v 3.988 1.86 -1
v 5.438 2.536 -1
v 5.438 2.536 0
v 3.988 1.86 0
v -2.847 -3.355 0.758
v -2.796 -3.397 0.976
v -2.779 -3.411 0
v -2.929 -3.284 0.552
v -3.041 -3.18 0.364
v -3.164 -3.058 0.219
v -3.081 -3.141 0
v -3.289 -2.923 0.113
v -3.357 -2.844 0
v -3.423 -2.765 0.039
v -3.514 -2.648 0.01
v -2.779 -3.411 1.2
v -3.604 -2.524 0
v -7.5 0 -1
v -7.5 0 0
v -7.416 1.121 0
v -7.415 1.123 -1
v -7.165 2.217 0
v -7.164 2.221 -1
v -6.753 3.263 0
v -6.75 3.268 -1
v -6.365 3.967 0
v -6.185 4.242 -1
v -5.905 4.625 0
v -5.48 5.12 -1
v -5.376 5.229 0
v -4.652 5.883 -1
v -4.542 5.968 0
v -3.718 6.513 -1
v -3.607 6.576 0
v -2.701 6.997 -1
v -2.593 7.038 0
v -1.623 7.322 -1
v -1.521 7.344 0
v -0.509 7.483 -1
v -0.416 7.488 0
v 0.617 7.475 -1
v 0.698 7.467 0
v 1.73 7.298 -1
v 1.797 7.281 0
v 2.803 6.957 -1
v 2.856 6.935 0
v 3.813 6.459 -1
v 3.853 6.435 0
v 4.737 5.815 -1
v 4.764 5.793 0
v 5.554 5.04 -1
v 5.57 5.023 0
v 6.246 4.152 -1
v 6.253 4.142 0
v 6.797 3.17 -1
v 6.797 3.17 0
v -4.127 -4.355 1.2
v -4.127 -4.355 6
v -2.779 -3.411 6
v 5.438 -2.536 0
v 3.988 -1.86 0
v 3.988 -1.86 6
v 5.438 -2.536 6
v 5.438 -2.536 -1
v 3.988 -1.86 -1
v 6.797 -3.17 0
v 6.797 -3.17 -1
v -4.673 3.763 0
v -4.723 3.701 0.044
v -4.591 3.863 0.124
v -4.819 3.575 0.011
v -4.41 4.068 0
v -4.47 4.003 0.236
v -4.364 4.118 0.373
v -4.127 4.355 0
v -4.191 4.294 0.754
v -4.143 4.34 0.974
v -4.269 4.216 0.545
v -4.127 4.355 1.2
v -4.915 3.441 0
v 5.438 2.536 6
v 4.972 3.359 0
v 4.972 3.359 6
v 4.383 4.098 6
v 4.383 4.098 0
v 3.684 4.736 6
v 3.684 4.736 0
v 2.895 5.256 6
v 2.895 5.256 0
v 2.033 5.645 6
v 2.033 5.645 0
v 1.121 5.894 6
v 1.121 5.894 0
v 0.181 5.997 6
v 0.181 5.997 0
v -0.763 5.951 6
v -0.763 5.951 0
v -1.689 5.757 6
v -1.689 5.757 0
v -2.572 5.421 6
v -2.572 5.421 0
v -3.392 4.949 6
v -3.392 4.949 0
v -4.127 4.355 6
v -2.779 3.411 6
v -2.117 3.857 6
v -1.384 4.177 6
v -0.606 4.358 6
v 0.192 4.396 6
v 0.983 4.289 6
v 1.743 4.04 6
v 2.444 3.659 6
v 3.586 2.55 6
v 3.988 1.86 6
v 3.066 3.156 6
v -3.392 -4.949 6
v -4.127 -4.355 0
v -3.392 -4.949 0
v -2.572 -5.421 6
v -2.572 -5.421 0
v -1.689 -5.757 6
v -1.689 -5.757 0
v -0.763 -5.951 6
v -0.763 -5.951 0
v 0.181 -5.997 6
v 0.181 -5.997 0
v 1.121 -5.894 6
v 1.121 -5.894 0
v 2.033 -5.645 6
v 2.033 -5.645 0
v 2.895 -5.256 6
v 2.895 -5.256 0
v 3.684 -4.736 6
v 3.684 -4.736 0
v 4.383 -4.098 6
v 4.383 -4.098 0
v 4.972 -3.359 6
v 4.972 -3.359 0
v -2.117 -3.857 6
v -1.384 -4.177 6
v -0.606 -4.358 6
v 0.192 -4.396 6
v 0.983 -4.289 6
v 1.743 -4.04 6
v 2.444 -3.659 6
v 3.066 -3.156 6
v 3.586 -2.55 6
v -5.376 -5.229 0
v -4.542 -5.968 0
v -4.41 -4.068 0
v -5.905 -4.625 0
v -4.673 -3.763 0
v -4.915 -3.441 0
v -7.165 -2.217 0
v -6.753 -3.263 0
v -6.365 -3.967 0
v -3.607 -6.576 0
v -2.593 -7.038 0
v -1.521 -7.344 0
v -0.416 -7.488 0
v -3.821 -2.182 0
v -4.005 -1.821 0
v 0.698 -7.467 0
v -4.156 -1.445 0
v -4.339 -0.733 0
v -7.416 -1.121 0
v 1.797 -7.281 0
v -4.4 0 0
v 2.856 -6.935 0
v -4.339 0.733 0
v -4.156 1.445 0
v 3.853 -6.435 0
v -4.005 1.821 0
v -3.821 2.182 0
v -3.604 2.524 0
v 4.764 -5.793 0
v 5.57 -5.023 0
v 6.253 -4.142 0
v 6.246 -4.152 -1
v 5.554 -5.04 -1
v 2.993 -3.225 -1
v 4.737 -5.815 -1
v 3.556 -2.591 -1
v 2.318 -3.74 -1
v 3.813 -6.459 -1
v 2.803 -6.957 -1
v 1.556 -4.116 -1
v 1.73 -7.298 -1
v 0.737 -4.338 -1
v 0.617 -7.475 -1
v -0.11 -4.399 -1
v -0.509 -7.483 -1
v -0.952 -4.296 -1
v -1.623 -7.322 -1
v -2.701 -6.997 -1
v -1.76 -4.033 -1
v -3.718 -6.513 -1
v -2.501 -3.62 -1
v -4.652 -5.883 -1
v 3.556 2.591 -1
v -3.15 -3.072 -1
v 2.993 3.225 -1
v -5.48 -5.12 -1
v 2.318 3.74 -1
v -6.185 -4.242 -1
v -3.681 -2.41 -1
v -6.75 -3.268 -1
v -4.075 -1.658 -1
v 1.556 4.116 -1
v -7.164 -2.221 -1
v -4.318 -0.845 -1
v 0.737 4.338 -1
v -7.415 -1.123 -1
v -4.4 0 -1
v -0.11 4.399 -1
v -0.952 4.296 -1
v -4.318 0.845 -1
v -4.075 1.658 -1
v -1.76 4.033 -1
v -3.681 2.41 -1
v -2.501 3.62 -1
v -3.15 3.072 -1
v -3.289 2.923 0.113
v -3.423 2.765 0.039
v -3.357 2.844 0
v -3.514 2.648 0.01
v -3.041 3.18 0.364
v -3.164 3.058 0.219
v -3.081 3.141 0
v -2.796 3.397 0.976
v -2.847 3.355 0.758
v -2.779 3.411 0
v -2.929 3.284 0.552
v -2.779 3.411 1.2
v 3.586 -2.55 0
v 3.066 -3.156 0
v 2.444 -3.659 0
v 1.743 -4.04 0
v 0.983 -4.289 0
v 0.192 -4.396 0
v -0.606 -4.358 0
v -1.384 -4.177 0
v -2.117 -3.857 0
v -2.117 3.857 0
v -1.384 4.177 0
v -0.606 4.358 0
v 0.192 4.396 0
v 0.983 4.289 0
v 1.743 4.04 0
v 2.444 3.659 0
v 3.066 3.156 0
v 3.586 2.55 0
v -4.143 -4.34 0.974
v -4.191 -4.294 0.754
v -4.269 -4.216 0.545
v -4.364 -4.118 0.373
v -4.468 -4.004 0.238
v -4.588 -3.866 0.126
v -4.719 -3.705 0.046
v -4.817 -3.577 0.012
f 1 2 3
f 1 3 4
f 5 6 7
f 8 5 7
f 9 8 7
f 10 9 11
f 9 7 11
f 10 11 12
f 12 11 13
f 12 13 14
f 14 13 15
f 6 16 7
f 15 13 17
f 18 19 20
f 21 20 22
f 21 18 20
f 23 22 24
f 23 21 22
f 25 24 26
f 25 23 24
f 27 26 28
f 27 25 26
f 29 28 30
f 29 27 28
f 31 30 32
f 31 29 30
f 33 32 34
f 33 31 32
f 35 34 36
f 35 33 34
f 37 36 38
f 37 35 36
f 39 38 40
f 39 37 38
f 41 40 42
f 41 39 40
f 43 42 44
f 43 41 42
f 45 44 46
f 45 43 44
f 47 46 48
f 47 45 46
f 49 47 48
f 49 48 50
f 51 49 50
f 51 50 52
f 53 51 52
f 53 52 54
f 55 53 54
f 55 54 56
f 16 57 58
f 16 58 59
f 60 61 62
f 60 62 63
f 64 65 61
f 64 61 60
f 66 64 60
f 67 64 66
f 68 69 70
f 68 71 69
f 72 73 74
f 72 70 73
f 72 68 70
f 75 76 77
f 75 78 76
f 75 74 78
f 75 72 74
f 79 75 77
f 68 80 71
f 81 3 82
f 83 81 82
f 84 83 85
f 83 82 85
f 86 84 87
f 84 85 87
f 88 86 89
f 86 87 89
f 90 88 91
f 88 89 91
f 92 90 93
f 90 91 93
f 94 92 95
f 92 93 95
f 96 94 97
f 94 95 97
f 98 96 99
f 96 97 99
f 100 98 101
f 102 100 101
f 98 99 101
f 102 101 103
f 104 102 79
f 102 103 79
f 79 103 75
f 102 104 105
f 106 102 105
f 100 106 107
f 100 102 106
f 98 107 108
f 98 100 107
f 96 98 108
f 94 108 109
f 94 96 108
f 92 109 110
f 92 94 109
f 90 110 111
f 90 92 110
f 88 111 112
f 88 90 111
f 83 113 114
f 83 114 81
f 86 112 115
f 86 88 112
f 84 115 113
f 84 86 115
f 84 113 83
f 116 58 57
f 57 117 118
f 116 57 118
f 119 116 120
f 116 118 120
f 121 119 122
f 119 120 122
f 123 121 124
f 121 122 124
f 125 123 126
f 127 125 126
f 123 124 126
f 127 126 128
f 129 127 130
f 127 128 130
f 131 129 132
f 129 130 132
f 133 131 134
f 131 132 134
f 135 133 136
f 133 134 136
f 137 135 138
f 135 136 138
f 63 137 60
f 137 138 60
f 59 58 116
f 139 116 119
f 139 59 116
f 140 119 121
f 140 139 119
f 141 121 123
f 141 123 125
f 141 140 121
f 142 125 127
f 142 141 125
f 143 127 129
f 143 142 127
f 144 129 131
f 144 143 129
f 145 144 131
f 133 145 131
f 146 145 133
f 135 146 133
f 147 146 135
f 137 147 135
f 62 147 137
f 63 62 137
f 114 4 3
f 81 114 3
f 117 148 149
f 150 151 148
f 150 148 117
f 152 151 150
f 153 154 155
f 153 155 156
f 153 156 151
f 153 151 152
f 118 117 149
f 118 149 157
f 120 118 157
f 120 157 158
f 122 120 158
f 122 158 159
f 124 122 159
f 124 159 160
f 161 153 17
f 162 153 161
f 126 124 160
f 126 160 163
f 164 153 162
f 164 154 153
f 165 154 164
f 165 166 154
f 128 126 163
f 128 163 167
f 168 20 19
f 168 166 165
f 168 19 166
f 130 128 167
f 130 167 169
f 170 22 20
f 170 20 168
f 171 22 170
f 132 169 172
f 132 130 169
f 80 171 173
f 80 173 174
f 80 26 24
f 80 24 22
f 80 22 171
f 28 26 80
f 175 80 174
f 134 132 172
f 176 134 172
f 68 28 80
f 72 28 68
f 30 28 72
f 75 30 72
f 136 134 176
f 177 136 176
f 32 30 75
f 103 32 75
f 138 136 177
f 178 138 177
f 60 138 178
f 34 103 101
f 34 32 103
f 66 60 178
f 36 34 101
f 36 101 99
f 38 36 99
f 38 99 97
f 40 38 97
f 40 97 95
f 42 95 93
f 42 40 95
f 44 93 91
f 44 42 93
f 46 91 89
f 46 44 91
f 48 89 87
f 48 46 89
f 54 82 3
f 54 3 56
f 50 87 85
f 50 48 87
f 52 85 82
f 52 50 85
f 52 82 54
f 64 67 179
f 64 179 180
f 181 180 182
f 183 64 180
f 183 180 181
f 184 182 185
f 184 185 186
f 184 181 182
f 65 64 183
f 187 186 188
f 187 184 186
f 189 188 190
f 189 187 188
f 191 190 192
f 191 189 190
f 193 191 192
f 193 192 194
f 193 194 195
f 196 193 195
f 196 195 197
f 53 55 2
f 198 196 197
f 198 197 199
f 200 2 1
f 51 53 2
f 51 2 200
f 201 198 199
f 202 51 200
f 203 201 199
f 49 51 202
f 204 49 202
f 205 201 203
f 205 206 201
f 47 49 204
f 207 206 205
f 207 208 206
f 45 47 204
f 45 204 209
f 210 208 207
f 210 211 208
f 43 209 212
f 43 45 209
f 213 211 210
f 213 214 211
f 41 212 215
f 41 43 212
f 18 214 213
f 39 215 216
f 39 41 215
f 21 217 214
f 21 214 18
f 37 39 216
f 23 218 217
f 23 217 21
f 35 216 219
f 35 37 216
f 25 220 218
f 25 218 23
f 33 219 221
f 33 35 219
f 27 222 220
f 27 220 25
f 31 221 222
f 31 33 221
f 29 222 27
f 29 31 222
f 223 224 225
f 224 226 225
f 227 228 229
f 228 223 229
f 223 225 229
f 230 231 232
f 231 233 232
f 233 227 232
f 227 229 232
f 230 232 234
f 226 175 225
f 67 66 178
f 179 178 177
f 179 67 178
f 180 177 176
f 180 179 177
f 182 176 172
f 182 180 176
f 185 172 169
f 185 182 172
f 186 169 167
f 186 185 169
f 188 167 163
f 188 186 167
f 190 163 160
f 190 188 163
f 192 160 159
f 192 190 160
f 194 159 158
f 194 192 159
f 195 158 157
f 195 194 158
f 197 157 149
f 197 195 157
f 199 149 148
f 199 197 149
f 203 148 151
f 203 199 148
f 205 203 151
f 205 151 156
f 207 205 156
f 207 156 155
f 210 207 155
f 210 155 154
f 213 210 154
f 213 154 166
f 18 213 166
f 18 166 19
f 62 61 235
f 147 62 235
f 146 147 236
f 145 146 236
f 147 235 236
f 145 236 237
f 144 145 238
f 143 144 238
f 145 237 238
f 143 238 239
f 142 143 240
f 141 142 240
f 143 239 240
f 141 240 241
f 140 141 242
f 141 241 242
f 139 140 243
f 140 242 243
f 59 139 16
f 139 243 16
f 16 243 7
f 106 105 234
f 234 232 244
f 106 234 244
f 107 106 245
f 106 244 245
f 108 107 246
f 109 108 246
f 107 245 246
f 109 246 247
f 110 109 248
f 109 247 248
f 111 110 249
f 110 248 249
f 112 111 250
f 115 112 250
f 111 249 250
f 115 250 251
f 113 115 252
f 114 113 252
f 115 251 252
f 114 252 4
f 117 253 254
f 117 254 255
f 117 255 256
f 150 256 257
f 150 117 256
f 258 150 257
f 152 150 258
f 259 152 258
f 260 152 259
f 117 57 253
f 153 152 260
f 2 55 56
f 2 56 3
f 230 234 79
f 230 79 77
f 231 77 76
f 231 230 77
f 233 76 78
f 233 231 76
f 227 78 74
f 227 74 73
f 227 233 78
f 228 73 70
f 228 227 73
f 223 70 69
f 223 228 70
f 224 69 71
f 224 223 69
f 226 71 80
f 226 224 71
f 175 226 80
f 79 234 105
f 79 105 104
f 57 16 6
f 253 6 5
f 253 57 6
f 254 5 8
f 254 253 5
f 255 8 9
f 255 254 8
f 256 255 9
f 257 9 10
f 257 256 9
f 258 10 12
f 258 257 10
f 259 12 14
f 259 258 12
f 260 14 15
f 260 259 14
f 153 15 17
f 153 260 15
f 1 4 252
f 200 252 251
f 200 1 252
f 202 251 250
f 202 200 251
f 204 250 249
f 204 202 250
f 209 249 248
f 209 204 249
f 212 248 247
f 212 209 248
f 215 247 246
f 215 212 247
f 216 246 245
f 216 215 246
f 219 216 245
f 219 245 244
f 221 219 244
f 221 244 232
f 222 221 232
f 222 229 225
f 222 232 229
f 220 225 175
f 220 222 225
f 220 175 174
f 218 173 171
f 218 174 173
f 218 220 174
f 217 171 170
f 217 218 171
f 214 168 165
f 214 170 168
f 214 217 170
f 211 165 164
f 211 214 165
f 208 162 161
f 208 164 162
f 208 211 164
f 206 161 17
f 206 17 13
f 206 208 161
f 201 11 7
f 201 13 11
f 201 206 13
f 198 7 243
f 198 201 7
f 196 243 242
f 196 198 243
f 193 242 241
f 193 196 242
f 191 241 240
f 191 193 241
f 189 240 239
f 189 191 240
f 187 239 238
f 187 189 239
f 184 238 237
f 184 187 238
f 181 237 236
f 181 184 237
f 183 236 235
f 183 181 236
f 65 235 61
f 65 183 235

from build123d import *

# Parameters (mm, degrees)
BOSS_EXTRUDE1_DEPTH = 6
BOSS_EXTRUDE2_START = 1
BOSS_EXTRUDE2_DEPTH = 1
CUT_EXTRUDE1_START  = -6
CUT_EXTRUDE1_DEPTH  = 6
CUT_EXTRUDE2_START  = -6
CUT_EXTRUDE2_DEPTH  = 6
FILLET1_R           = 1.2


with BuildPart() as part:
    # Sketch1 → Boss-Extrude1 (new body)
    with BuildSketch(Plane.XY):
        with BuildLine():
            Line((3.987754263, 1.859520352), (5.437846722, 2.53570957))
            ThreePointArc((5.437846722, 2.53570957), (-6, 0), (5.437846722, -2.53570957))
            Line((5.437846722, -2.53570957), (3.987754263, -1.859520352))
            ThreePointArc((3.987754263, -1.859520352), (-4.4, 0), (3.987754263, 1.859520352))
        make_face()
    extrude(amount=BOSS_EXTRUDE1_DEPTH)

    # Sketch2 → Boss-Extrude2 (add)
    with BuildSketch(Plane(origin=(0, 0, 0), x_dir=(-1, 0, 0), z_dir=(0, 0, -1)).offset(BOSS_EXTRUDE2_START)):
        with BuildLine():
            Line((-3.987754263, -1.859520352), (-5.437846722, -2.53570957))
            ThreePointArc((-5.437846722, -2.53570957), (6, 0), (-5.437846722, 2.53570957))
            Line((-5.437846722, 2.53570957), (-3.987754263, 1.859520352))
            ThreePointArc((-3.987754263, 1.859520352), (4.4, 0), (-3.987754263, -1.859520352))
        make_face()
        with BuildLine():
            Line((-6.797308403, 3.169636963), (-5.437846722, 2.53570957))
            ThreePointArc((-5.437846722, 2.53570957), (6, 0), (-5.437846722, -2.53570957))
            Line((-5.437846722, -2.53570957), (-6.797308403, -3.169636963))
            ThreePointArc((-6.797308403, -3.169636963), (1.623297105, -7.322220053), (7.5, 0))
            ThreePointArc((7.5, 0), (1.623297105, 7.322220053), (-6.797308403, 3.169636963))
        make_face()
    extrude(amount=-BOSS_EXTRUDE2_DEPTH)

    # Sketch3 → Cut-Extrude1 (cut)
    with BuildSketch(Plane.XY.offset(6).offset(CUT_EXTRUDE1_START)):
        with BuildLine():
            ThreePointArc((-5.503902596, -2.388944581), (-4.914912266, -3.441458618), (-4.127319149, -4.354909487))
            Line((-4.127319149, -4.354909487), (-2.779344429, -3.411047427))
            ThreePointArc((-2.779344429, -3.411047427), (-3.604268995, -2.52373632), (-4.155927876, -1.44508252))
            Line((-4.155927876, -1.44508252), (-5.503902596, -2.388944581))
        make_face()
        with BuildLine():
            ThreePointArc((-5.376200178, 5.229385398), (-6.143640332, 4.301823273), (-6.752783625, 3.263420492))
            Line((-6.752783625, 3.263420492), (-5.503902596, 2.388944581))
            ThreePointArc((-5.503902596, 2.388944581), (-4.914912266, 3.441458618), (-4.127319149, 4.354909487))
            Line((-4.127319149, 4.354909487), (-5.376200178, 5.229385398))
        make_face()
        with BuildLine():
            ThreePointArc((-4.127319149, 4.354909487), (-4.914912266, 3.441458618), (-5.503902596, 2.388944581))
            Line((-5.503902596, 2.388944581), (-4.155927876, 1.44508252))
            ThreePointArc((-4.155927876, 1.44508252), (-3.604268995, 2.52373632), (-2.779344429, 3.411047427))
            Line((-2.779344429, 3.411047427), (-4.127319149, 4.354909487))
        make_face()
        with BuildLine():
            ThreePointArc((-6.752783625, -3.263420492), (-6.143640332, -4.301823273), (-5.376200178, -5.229385398))
            Line((-5.376200178, -5.229385398), (-4.127319149, -4.354909487))
            ThreePointArc((-4.127319149, -4.354909487), (-4.914912266, -3.441458618), (-5.503902596, -2.388944581))
            Line((-5.503902596, -2.388944581), (-6.752783625, -3.263420492))
        make_face()
    extrude(amount=CUT_EXTRUDE1_DEPTH, mode=Mode.SUBTRACT)

    # Sketch4 → Cut-Extrude2 (cut)
    with BuildSketch(Plane.XY.offset(6).offset(CUT_EXTRUDE2_START)):
        with BuildLine():
            Line((-4.155927876, 1.44508252), (-5.503902596, 2.388944581))
            ThreePointArc((-5.503902596, 2.388944581), (-6, 0), (-5.503902596, -2.388944581))
            Line((-5.503902596, -2.388944581), (-4.155927876, -1.44508252))
            ThreePointArc((-4.155927876, -1.44508252), (-4.4, 0), (-4.155927876, 1.44508252))
        make_face()
    extrude(amount=CUT_EXTRUDE2_DEPTH, mode=Mode.SUBTRACT)

    # Fillet1
    # the kernel refuses this fillet: 1.2 mm, written as the material it adds along each edge
    with BuildSketch(Plane(origin=(-0.321888296, 1.690318118, 0), x_dir=(0, 0, 1), z_dir=(-0.8191520442889906, 0.5735764363510478, 0))) as fillet1_piece_1_section:
        with BuildLine():
            CenterArc((FILLET1_R, -FILLET1_R), FILLET1_R, 90, 90)
            Line((0, -FILLET1_R), (0, 0))
            Line((0, 0), (FILLET1_R, 0))
        make_face()
    fillet1_piece_1 = extrude(amount=7.645573285, mode=Mode.PRIVATE)
    fillet1_piece_1 = fillet1_piece_1 - Plane(origin=(0, 0, 0.272987798), x_dir=(0.9063077870366507, -0.4226182617406978, 0), z_dir=(0, 0, -1)) * Cylinder(4.4, 21, mode=Mode.PRIVATE)
    fillet1_piece_1 = fillet1_piece_1 & Plane(origin=(0, 0, 0.272987798), x_dir=(0.9063077870366507, 0.4226182617406977, 0), z_dir=(0, 0, -1)) * Cylinder(6, 21, mode=Mode.PRIVATE)
    with BuildSketch(Plane(origin=(-6.584775282, -6.075638796, 0), x_dir=(-0.5735764363510464, 0.8191520442889915, 0), z_dir=(0.8191520442889916, 0.5735764363510465, 0))) as fillet1_piece_2_section:
        with BuildLine():
            CenterArc((FILLET1_R, FILLET1_R), FILLET1_R, 180, 90)
            Line((0, FILLET1_R), (0, 0))
            Line((0, 0), (FILLET1_R, 0))
        make_face()
    fillet1_piece_2 = extrude(amount=7.645573285, mode=Mode.PRIVATE)
    fillet1_piece_2 = fillet1_piece_2 - Plane(origin=(0, 0, 0.272987172), x_dir=(0.9063077870366507, 0.4226182617406977, 0), z_dir=(0, 0, -1)) * Cylinder(4.4, 21, mode=Mode.PRIVATE)
    fillet1_piece_2 = fillet1_piece_2 & Plane(origin=(0, 0, 0.272987172), x_dir=(0.9063077870366507, 0.4226182617406977, 0), z_dir=(0, 0, -1)) * Cylinder(6, 21, mode=Mode.PRIVATE)
    add([fillet1_piece_1, fillet1_piece_2])


solid = part.part
